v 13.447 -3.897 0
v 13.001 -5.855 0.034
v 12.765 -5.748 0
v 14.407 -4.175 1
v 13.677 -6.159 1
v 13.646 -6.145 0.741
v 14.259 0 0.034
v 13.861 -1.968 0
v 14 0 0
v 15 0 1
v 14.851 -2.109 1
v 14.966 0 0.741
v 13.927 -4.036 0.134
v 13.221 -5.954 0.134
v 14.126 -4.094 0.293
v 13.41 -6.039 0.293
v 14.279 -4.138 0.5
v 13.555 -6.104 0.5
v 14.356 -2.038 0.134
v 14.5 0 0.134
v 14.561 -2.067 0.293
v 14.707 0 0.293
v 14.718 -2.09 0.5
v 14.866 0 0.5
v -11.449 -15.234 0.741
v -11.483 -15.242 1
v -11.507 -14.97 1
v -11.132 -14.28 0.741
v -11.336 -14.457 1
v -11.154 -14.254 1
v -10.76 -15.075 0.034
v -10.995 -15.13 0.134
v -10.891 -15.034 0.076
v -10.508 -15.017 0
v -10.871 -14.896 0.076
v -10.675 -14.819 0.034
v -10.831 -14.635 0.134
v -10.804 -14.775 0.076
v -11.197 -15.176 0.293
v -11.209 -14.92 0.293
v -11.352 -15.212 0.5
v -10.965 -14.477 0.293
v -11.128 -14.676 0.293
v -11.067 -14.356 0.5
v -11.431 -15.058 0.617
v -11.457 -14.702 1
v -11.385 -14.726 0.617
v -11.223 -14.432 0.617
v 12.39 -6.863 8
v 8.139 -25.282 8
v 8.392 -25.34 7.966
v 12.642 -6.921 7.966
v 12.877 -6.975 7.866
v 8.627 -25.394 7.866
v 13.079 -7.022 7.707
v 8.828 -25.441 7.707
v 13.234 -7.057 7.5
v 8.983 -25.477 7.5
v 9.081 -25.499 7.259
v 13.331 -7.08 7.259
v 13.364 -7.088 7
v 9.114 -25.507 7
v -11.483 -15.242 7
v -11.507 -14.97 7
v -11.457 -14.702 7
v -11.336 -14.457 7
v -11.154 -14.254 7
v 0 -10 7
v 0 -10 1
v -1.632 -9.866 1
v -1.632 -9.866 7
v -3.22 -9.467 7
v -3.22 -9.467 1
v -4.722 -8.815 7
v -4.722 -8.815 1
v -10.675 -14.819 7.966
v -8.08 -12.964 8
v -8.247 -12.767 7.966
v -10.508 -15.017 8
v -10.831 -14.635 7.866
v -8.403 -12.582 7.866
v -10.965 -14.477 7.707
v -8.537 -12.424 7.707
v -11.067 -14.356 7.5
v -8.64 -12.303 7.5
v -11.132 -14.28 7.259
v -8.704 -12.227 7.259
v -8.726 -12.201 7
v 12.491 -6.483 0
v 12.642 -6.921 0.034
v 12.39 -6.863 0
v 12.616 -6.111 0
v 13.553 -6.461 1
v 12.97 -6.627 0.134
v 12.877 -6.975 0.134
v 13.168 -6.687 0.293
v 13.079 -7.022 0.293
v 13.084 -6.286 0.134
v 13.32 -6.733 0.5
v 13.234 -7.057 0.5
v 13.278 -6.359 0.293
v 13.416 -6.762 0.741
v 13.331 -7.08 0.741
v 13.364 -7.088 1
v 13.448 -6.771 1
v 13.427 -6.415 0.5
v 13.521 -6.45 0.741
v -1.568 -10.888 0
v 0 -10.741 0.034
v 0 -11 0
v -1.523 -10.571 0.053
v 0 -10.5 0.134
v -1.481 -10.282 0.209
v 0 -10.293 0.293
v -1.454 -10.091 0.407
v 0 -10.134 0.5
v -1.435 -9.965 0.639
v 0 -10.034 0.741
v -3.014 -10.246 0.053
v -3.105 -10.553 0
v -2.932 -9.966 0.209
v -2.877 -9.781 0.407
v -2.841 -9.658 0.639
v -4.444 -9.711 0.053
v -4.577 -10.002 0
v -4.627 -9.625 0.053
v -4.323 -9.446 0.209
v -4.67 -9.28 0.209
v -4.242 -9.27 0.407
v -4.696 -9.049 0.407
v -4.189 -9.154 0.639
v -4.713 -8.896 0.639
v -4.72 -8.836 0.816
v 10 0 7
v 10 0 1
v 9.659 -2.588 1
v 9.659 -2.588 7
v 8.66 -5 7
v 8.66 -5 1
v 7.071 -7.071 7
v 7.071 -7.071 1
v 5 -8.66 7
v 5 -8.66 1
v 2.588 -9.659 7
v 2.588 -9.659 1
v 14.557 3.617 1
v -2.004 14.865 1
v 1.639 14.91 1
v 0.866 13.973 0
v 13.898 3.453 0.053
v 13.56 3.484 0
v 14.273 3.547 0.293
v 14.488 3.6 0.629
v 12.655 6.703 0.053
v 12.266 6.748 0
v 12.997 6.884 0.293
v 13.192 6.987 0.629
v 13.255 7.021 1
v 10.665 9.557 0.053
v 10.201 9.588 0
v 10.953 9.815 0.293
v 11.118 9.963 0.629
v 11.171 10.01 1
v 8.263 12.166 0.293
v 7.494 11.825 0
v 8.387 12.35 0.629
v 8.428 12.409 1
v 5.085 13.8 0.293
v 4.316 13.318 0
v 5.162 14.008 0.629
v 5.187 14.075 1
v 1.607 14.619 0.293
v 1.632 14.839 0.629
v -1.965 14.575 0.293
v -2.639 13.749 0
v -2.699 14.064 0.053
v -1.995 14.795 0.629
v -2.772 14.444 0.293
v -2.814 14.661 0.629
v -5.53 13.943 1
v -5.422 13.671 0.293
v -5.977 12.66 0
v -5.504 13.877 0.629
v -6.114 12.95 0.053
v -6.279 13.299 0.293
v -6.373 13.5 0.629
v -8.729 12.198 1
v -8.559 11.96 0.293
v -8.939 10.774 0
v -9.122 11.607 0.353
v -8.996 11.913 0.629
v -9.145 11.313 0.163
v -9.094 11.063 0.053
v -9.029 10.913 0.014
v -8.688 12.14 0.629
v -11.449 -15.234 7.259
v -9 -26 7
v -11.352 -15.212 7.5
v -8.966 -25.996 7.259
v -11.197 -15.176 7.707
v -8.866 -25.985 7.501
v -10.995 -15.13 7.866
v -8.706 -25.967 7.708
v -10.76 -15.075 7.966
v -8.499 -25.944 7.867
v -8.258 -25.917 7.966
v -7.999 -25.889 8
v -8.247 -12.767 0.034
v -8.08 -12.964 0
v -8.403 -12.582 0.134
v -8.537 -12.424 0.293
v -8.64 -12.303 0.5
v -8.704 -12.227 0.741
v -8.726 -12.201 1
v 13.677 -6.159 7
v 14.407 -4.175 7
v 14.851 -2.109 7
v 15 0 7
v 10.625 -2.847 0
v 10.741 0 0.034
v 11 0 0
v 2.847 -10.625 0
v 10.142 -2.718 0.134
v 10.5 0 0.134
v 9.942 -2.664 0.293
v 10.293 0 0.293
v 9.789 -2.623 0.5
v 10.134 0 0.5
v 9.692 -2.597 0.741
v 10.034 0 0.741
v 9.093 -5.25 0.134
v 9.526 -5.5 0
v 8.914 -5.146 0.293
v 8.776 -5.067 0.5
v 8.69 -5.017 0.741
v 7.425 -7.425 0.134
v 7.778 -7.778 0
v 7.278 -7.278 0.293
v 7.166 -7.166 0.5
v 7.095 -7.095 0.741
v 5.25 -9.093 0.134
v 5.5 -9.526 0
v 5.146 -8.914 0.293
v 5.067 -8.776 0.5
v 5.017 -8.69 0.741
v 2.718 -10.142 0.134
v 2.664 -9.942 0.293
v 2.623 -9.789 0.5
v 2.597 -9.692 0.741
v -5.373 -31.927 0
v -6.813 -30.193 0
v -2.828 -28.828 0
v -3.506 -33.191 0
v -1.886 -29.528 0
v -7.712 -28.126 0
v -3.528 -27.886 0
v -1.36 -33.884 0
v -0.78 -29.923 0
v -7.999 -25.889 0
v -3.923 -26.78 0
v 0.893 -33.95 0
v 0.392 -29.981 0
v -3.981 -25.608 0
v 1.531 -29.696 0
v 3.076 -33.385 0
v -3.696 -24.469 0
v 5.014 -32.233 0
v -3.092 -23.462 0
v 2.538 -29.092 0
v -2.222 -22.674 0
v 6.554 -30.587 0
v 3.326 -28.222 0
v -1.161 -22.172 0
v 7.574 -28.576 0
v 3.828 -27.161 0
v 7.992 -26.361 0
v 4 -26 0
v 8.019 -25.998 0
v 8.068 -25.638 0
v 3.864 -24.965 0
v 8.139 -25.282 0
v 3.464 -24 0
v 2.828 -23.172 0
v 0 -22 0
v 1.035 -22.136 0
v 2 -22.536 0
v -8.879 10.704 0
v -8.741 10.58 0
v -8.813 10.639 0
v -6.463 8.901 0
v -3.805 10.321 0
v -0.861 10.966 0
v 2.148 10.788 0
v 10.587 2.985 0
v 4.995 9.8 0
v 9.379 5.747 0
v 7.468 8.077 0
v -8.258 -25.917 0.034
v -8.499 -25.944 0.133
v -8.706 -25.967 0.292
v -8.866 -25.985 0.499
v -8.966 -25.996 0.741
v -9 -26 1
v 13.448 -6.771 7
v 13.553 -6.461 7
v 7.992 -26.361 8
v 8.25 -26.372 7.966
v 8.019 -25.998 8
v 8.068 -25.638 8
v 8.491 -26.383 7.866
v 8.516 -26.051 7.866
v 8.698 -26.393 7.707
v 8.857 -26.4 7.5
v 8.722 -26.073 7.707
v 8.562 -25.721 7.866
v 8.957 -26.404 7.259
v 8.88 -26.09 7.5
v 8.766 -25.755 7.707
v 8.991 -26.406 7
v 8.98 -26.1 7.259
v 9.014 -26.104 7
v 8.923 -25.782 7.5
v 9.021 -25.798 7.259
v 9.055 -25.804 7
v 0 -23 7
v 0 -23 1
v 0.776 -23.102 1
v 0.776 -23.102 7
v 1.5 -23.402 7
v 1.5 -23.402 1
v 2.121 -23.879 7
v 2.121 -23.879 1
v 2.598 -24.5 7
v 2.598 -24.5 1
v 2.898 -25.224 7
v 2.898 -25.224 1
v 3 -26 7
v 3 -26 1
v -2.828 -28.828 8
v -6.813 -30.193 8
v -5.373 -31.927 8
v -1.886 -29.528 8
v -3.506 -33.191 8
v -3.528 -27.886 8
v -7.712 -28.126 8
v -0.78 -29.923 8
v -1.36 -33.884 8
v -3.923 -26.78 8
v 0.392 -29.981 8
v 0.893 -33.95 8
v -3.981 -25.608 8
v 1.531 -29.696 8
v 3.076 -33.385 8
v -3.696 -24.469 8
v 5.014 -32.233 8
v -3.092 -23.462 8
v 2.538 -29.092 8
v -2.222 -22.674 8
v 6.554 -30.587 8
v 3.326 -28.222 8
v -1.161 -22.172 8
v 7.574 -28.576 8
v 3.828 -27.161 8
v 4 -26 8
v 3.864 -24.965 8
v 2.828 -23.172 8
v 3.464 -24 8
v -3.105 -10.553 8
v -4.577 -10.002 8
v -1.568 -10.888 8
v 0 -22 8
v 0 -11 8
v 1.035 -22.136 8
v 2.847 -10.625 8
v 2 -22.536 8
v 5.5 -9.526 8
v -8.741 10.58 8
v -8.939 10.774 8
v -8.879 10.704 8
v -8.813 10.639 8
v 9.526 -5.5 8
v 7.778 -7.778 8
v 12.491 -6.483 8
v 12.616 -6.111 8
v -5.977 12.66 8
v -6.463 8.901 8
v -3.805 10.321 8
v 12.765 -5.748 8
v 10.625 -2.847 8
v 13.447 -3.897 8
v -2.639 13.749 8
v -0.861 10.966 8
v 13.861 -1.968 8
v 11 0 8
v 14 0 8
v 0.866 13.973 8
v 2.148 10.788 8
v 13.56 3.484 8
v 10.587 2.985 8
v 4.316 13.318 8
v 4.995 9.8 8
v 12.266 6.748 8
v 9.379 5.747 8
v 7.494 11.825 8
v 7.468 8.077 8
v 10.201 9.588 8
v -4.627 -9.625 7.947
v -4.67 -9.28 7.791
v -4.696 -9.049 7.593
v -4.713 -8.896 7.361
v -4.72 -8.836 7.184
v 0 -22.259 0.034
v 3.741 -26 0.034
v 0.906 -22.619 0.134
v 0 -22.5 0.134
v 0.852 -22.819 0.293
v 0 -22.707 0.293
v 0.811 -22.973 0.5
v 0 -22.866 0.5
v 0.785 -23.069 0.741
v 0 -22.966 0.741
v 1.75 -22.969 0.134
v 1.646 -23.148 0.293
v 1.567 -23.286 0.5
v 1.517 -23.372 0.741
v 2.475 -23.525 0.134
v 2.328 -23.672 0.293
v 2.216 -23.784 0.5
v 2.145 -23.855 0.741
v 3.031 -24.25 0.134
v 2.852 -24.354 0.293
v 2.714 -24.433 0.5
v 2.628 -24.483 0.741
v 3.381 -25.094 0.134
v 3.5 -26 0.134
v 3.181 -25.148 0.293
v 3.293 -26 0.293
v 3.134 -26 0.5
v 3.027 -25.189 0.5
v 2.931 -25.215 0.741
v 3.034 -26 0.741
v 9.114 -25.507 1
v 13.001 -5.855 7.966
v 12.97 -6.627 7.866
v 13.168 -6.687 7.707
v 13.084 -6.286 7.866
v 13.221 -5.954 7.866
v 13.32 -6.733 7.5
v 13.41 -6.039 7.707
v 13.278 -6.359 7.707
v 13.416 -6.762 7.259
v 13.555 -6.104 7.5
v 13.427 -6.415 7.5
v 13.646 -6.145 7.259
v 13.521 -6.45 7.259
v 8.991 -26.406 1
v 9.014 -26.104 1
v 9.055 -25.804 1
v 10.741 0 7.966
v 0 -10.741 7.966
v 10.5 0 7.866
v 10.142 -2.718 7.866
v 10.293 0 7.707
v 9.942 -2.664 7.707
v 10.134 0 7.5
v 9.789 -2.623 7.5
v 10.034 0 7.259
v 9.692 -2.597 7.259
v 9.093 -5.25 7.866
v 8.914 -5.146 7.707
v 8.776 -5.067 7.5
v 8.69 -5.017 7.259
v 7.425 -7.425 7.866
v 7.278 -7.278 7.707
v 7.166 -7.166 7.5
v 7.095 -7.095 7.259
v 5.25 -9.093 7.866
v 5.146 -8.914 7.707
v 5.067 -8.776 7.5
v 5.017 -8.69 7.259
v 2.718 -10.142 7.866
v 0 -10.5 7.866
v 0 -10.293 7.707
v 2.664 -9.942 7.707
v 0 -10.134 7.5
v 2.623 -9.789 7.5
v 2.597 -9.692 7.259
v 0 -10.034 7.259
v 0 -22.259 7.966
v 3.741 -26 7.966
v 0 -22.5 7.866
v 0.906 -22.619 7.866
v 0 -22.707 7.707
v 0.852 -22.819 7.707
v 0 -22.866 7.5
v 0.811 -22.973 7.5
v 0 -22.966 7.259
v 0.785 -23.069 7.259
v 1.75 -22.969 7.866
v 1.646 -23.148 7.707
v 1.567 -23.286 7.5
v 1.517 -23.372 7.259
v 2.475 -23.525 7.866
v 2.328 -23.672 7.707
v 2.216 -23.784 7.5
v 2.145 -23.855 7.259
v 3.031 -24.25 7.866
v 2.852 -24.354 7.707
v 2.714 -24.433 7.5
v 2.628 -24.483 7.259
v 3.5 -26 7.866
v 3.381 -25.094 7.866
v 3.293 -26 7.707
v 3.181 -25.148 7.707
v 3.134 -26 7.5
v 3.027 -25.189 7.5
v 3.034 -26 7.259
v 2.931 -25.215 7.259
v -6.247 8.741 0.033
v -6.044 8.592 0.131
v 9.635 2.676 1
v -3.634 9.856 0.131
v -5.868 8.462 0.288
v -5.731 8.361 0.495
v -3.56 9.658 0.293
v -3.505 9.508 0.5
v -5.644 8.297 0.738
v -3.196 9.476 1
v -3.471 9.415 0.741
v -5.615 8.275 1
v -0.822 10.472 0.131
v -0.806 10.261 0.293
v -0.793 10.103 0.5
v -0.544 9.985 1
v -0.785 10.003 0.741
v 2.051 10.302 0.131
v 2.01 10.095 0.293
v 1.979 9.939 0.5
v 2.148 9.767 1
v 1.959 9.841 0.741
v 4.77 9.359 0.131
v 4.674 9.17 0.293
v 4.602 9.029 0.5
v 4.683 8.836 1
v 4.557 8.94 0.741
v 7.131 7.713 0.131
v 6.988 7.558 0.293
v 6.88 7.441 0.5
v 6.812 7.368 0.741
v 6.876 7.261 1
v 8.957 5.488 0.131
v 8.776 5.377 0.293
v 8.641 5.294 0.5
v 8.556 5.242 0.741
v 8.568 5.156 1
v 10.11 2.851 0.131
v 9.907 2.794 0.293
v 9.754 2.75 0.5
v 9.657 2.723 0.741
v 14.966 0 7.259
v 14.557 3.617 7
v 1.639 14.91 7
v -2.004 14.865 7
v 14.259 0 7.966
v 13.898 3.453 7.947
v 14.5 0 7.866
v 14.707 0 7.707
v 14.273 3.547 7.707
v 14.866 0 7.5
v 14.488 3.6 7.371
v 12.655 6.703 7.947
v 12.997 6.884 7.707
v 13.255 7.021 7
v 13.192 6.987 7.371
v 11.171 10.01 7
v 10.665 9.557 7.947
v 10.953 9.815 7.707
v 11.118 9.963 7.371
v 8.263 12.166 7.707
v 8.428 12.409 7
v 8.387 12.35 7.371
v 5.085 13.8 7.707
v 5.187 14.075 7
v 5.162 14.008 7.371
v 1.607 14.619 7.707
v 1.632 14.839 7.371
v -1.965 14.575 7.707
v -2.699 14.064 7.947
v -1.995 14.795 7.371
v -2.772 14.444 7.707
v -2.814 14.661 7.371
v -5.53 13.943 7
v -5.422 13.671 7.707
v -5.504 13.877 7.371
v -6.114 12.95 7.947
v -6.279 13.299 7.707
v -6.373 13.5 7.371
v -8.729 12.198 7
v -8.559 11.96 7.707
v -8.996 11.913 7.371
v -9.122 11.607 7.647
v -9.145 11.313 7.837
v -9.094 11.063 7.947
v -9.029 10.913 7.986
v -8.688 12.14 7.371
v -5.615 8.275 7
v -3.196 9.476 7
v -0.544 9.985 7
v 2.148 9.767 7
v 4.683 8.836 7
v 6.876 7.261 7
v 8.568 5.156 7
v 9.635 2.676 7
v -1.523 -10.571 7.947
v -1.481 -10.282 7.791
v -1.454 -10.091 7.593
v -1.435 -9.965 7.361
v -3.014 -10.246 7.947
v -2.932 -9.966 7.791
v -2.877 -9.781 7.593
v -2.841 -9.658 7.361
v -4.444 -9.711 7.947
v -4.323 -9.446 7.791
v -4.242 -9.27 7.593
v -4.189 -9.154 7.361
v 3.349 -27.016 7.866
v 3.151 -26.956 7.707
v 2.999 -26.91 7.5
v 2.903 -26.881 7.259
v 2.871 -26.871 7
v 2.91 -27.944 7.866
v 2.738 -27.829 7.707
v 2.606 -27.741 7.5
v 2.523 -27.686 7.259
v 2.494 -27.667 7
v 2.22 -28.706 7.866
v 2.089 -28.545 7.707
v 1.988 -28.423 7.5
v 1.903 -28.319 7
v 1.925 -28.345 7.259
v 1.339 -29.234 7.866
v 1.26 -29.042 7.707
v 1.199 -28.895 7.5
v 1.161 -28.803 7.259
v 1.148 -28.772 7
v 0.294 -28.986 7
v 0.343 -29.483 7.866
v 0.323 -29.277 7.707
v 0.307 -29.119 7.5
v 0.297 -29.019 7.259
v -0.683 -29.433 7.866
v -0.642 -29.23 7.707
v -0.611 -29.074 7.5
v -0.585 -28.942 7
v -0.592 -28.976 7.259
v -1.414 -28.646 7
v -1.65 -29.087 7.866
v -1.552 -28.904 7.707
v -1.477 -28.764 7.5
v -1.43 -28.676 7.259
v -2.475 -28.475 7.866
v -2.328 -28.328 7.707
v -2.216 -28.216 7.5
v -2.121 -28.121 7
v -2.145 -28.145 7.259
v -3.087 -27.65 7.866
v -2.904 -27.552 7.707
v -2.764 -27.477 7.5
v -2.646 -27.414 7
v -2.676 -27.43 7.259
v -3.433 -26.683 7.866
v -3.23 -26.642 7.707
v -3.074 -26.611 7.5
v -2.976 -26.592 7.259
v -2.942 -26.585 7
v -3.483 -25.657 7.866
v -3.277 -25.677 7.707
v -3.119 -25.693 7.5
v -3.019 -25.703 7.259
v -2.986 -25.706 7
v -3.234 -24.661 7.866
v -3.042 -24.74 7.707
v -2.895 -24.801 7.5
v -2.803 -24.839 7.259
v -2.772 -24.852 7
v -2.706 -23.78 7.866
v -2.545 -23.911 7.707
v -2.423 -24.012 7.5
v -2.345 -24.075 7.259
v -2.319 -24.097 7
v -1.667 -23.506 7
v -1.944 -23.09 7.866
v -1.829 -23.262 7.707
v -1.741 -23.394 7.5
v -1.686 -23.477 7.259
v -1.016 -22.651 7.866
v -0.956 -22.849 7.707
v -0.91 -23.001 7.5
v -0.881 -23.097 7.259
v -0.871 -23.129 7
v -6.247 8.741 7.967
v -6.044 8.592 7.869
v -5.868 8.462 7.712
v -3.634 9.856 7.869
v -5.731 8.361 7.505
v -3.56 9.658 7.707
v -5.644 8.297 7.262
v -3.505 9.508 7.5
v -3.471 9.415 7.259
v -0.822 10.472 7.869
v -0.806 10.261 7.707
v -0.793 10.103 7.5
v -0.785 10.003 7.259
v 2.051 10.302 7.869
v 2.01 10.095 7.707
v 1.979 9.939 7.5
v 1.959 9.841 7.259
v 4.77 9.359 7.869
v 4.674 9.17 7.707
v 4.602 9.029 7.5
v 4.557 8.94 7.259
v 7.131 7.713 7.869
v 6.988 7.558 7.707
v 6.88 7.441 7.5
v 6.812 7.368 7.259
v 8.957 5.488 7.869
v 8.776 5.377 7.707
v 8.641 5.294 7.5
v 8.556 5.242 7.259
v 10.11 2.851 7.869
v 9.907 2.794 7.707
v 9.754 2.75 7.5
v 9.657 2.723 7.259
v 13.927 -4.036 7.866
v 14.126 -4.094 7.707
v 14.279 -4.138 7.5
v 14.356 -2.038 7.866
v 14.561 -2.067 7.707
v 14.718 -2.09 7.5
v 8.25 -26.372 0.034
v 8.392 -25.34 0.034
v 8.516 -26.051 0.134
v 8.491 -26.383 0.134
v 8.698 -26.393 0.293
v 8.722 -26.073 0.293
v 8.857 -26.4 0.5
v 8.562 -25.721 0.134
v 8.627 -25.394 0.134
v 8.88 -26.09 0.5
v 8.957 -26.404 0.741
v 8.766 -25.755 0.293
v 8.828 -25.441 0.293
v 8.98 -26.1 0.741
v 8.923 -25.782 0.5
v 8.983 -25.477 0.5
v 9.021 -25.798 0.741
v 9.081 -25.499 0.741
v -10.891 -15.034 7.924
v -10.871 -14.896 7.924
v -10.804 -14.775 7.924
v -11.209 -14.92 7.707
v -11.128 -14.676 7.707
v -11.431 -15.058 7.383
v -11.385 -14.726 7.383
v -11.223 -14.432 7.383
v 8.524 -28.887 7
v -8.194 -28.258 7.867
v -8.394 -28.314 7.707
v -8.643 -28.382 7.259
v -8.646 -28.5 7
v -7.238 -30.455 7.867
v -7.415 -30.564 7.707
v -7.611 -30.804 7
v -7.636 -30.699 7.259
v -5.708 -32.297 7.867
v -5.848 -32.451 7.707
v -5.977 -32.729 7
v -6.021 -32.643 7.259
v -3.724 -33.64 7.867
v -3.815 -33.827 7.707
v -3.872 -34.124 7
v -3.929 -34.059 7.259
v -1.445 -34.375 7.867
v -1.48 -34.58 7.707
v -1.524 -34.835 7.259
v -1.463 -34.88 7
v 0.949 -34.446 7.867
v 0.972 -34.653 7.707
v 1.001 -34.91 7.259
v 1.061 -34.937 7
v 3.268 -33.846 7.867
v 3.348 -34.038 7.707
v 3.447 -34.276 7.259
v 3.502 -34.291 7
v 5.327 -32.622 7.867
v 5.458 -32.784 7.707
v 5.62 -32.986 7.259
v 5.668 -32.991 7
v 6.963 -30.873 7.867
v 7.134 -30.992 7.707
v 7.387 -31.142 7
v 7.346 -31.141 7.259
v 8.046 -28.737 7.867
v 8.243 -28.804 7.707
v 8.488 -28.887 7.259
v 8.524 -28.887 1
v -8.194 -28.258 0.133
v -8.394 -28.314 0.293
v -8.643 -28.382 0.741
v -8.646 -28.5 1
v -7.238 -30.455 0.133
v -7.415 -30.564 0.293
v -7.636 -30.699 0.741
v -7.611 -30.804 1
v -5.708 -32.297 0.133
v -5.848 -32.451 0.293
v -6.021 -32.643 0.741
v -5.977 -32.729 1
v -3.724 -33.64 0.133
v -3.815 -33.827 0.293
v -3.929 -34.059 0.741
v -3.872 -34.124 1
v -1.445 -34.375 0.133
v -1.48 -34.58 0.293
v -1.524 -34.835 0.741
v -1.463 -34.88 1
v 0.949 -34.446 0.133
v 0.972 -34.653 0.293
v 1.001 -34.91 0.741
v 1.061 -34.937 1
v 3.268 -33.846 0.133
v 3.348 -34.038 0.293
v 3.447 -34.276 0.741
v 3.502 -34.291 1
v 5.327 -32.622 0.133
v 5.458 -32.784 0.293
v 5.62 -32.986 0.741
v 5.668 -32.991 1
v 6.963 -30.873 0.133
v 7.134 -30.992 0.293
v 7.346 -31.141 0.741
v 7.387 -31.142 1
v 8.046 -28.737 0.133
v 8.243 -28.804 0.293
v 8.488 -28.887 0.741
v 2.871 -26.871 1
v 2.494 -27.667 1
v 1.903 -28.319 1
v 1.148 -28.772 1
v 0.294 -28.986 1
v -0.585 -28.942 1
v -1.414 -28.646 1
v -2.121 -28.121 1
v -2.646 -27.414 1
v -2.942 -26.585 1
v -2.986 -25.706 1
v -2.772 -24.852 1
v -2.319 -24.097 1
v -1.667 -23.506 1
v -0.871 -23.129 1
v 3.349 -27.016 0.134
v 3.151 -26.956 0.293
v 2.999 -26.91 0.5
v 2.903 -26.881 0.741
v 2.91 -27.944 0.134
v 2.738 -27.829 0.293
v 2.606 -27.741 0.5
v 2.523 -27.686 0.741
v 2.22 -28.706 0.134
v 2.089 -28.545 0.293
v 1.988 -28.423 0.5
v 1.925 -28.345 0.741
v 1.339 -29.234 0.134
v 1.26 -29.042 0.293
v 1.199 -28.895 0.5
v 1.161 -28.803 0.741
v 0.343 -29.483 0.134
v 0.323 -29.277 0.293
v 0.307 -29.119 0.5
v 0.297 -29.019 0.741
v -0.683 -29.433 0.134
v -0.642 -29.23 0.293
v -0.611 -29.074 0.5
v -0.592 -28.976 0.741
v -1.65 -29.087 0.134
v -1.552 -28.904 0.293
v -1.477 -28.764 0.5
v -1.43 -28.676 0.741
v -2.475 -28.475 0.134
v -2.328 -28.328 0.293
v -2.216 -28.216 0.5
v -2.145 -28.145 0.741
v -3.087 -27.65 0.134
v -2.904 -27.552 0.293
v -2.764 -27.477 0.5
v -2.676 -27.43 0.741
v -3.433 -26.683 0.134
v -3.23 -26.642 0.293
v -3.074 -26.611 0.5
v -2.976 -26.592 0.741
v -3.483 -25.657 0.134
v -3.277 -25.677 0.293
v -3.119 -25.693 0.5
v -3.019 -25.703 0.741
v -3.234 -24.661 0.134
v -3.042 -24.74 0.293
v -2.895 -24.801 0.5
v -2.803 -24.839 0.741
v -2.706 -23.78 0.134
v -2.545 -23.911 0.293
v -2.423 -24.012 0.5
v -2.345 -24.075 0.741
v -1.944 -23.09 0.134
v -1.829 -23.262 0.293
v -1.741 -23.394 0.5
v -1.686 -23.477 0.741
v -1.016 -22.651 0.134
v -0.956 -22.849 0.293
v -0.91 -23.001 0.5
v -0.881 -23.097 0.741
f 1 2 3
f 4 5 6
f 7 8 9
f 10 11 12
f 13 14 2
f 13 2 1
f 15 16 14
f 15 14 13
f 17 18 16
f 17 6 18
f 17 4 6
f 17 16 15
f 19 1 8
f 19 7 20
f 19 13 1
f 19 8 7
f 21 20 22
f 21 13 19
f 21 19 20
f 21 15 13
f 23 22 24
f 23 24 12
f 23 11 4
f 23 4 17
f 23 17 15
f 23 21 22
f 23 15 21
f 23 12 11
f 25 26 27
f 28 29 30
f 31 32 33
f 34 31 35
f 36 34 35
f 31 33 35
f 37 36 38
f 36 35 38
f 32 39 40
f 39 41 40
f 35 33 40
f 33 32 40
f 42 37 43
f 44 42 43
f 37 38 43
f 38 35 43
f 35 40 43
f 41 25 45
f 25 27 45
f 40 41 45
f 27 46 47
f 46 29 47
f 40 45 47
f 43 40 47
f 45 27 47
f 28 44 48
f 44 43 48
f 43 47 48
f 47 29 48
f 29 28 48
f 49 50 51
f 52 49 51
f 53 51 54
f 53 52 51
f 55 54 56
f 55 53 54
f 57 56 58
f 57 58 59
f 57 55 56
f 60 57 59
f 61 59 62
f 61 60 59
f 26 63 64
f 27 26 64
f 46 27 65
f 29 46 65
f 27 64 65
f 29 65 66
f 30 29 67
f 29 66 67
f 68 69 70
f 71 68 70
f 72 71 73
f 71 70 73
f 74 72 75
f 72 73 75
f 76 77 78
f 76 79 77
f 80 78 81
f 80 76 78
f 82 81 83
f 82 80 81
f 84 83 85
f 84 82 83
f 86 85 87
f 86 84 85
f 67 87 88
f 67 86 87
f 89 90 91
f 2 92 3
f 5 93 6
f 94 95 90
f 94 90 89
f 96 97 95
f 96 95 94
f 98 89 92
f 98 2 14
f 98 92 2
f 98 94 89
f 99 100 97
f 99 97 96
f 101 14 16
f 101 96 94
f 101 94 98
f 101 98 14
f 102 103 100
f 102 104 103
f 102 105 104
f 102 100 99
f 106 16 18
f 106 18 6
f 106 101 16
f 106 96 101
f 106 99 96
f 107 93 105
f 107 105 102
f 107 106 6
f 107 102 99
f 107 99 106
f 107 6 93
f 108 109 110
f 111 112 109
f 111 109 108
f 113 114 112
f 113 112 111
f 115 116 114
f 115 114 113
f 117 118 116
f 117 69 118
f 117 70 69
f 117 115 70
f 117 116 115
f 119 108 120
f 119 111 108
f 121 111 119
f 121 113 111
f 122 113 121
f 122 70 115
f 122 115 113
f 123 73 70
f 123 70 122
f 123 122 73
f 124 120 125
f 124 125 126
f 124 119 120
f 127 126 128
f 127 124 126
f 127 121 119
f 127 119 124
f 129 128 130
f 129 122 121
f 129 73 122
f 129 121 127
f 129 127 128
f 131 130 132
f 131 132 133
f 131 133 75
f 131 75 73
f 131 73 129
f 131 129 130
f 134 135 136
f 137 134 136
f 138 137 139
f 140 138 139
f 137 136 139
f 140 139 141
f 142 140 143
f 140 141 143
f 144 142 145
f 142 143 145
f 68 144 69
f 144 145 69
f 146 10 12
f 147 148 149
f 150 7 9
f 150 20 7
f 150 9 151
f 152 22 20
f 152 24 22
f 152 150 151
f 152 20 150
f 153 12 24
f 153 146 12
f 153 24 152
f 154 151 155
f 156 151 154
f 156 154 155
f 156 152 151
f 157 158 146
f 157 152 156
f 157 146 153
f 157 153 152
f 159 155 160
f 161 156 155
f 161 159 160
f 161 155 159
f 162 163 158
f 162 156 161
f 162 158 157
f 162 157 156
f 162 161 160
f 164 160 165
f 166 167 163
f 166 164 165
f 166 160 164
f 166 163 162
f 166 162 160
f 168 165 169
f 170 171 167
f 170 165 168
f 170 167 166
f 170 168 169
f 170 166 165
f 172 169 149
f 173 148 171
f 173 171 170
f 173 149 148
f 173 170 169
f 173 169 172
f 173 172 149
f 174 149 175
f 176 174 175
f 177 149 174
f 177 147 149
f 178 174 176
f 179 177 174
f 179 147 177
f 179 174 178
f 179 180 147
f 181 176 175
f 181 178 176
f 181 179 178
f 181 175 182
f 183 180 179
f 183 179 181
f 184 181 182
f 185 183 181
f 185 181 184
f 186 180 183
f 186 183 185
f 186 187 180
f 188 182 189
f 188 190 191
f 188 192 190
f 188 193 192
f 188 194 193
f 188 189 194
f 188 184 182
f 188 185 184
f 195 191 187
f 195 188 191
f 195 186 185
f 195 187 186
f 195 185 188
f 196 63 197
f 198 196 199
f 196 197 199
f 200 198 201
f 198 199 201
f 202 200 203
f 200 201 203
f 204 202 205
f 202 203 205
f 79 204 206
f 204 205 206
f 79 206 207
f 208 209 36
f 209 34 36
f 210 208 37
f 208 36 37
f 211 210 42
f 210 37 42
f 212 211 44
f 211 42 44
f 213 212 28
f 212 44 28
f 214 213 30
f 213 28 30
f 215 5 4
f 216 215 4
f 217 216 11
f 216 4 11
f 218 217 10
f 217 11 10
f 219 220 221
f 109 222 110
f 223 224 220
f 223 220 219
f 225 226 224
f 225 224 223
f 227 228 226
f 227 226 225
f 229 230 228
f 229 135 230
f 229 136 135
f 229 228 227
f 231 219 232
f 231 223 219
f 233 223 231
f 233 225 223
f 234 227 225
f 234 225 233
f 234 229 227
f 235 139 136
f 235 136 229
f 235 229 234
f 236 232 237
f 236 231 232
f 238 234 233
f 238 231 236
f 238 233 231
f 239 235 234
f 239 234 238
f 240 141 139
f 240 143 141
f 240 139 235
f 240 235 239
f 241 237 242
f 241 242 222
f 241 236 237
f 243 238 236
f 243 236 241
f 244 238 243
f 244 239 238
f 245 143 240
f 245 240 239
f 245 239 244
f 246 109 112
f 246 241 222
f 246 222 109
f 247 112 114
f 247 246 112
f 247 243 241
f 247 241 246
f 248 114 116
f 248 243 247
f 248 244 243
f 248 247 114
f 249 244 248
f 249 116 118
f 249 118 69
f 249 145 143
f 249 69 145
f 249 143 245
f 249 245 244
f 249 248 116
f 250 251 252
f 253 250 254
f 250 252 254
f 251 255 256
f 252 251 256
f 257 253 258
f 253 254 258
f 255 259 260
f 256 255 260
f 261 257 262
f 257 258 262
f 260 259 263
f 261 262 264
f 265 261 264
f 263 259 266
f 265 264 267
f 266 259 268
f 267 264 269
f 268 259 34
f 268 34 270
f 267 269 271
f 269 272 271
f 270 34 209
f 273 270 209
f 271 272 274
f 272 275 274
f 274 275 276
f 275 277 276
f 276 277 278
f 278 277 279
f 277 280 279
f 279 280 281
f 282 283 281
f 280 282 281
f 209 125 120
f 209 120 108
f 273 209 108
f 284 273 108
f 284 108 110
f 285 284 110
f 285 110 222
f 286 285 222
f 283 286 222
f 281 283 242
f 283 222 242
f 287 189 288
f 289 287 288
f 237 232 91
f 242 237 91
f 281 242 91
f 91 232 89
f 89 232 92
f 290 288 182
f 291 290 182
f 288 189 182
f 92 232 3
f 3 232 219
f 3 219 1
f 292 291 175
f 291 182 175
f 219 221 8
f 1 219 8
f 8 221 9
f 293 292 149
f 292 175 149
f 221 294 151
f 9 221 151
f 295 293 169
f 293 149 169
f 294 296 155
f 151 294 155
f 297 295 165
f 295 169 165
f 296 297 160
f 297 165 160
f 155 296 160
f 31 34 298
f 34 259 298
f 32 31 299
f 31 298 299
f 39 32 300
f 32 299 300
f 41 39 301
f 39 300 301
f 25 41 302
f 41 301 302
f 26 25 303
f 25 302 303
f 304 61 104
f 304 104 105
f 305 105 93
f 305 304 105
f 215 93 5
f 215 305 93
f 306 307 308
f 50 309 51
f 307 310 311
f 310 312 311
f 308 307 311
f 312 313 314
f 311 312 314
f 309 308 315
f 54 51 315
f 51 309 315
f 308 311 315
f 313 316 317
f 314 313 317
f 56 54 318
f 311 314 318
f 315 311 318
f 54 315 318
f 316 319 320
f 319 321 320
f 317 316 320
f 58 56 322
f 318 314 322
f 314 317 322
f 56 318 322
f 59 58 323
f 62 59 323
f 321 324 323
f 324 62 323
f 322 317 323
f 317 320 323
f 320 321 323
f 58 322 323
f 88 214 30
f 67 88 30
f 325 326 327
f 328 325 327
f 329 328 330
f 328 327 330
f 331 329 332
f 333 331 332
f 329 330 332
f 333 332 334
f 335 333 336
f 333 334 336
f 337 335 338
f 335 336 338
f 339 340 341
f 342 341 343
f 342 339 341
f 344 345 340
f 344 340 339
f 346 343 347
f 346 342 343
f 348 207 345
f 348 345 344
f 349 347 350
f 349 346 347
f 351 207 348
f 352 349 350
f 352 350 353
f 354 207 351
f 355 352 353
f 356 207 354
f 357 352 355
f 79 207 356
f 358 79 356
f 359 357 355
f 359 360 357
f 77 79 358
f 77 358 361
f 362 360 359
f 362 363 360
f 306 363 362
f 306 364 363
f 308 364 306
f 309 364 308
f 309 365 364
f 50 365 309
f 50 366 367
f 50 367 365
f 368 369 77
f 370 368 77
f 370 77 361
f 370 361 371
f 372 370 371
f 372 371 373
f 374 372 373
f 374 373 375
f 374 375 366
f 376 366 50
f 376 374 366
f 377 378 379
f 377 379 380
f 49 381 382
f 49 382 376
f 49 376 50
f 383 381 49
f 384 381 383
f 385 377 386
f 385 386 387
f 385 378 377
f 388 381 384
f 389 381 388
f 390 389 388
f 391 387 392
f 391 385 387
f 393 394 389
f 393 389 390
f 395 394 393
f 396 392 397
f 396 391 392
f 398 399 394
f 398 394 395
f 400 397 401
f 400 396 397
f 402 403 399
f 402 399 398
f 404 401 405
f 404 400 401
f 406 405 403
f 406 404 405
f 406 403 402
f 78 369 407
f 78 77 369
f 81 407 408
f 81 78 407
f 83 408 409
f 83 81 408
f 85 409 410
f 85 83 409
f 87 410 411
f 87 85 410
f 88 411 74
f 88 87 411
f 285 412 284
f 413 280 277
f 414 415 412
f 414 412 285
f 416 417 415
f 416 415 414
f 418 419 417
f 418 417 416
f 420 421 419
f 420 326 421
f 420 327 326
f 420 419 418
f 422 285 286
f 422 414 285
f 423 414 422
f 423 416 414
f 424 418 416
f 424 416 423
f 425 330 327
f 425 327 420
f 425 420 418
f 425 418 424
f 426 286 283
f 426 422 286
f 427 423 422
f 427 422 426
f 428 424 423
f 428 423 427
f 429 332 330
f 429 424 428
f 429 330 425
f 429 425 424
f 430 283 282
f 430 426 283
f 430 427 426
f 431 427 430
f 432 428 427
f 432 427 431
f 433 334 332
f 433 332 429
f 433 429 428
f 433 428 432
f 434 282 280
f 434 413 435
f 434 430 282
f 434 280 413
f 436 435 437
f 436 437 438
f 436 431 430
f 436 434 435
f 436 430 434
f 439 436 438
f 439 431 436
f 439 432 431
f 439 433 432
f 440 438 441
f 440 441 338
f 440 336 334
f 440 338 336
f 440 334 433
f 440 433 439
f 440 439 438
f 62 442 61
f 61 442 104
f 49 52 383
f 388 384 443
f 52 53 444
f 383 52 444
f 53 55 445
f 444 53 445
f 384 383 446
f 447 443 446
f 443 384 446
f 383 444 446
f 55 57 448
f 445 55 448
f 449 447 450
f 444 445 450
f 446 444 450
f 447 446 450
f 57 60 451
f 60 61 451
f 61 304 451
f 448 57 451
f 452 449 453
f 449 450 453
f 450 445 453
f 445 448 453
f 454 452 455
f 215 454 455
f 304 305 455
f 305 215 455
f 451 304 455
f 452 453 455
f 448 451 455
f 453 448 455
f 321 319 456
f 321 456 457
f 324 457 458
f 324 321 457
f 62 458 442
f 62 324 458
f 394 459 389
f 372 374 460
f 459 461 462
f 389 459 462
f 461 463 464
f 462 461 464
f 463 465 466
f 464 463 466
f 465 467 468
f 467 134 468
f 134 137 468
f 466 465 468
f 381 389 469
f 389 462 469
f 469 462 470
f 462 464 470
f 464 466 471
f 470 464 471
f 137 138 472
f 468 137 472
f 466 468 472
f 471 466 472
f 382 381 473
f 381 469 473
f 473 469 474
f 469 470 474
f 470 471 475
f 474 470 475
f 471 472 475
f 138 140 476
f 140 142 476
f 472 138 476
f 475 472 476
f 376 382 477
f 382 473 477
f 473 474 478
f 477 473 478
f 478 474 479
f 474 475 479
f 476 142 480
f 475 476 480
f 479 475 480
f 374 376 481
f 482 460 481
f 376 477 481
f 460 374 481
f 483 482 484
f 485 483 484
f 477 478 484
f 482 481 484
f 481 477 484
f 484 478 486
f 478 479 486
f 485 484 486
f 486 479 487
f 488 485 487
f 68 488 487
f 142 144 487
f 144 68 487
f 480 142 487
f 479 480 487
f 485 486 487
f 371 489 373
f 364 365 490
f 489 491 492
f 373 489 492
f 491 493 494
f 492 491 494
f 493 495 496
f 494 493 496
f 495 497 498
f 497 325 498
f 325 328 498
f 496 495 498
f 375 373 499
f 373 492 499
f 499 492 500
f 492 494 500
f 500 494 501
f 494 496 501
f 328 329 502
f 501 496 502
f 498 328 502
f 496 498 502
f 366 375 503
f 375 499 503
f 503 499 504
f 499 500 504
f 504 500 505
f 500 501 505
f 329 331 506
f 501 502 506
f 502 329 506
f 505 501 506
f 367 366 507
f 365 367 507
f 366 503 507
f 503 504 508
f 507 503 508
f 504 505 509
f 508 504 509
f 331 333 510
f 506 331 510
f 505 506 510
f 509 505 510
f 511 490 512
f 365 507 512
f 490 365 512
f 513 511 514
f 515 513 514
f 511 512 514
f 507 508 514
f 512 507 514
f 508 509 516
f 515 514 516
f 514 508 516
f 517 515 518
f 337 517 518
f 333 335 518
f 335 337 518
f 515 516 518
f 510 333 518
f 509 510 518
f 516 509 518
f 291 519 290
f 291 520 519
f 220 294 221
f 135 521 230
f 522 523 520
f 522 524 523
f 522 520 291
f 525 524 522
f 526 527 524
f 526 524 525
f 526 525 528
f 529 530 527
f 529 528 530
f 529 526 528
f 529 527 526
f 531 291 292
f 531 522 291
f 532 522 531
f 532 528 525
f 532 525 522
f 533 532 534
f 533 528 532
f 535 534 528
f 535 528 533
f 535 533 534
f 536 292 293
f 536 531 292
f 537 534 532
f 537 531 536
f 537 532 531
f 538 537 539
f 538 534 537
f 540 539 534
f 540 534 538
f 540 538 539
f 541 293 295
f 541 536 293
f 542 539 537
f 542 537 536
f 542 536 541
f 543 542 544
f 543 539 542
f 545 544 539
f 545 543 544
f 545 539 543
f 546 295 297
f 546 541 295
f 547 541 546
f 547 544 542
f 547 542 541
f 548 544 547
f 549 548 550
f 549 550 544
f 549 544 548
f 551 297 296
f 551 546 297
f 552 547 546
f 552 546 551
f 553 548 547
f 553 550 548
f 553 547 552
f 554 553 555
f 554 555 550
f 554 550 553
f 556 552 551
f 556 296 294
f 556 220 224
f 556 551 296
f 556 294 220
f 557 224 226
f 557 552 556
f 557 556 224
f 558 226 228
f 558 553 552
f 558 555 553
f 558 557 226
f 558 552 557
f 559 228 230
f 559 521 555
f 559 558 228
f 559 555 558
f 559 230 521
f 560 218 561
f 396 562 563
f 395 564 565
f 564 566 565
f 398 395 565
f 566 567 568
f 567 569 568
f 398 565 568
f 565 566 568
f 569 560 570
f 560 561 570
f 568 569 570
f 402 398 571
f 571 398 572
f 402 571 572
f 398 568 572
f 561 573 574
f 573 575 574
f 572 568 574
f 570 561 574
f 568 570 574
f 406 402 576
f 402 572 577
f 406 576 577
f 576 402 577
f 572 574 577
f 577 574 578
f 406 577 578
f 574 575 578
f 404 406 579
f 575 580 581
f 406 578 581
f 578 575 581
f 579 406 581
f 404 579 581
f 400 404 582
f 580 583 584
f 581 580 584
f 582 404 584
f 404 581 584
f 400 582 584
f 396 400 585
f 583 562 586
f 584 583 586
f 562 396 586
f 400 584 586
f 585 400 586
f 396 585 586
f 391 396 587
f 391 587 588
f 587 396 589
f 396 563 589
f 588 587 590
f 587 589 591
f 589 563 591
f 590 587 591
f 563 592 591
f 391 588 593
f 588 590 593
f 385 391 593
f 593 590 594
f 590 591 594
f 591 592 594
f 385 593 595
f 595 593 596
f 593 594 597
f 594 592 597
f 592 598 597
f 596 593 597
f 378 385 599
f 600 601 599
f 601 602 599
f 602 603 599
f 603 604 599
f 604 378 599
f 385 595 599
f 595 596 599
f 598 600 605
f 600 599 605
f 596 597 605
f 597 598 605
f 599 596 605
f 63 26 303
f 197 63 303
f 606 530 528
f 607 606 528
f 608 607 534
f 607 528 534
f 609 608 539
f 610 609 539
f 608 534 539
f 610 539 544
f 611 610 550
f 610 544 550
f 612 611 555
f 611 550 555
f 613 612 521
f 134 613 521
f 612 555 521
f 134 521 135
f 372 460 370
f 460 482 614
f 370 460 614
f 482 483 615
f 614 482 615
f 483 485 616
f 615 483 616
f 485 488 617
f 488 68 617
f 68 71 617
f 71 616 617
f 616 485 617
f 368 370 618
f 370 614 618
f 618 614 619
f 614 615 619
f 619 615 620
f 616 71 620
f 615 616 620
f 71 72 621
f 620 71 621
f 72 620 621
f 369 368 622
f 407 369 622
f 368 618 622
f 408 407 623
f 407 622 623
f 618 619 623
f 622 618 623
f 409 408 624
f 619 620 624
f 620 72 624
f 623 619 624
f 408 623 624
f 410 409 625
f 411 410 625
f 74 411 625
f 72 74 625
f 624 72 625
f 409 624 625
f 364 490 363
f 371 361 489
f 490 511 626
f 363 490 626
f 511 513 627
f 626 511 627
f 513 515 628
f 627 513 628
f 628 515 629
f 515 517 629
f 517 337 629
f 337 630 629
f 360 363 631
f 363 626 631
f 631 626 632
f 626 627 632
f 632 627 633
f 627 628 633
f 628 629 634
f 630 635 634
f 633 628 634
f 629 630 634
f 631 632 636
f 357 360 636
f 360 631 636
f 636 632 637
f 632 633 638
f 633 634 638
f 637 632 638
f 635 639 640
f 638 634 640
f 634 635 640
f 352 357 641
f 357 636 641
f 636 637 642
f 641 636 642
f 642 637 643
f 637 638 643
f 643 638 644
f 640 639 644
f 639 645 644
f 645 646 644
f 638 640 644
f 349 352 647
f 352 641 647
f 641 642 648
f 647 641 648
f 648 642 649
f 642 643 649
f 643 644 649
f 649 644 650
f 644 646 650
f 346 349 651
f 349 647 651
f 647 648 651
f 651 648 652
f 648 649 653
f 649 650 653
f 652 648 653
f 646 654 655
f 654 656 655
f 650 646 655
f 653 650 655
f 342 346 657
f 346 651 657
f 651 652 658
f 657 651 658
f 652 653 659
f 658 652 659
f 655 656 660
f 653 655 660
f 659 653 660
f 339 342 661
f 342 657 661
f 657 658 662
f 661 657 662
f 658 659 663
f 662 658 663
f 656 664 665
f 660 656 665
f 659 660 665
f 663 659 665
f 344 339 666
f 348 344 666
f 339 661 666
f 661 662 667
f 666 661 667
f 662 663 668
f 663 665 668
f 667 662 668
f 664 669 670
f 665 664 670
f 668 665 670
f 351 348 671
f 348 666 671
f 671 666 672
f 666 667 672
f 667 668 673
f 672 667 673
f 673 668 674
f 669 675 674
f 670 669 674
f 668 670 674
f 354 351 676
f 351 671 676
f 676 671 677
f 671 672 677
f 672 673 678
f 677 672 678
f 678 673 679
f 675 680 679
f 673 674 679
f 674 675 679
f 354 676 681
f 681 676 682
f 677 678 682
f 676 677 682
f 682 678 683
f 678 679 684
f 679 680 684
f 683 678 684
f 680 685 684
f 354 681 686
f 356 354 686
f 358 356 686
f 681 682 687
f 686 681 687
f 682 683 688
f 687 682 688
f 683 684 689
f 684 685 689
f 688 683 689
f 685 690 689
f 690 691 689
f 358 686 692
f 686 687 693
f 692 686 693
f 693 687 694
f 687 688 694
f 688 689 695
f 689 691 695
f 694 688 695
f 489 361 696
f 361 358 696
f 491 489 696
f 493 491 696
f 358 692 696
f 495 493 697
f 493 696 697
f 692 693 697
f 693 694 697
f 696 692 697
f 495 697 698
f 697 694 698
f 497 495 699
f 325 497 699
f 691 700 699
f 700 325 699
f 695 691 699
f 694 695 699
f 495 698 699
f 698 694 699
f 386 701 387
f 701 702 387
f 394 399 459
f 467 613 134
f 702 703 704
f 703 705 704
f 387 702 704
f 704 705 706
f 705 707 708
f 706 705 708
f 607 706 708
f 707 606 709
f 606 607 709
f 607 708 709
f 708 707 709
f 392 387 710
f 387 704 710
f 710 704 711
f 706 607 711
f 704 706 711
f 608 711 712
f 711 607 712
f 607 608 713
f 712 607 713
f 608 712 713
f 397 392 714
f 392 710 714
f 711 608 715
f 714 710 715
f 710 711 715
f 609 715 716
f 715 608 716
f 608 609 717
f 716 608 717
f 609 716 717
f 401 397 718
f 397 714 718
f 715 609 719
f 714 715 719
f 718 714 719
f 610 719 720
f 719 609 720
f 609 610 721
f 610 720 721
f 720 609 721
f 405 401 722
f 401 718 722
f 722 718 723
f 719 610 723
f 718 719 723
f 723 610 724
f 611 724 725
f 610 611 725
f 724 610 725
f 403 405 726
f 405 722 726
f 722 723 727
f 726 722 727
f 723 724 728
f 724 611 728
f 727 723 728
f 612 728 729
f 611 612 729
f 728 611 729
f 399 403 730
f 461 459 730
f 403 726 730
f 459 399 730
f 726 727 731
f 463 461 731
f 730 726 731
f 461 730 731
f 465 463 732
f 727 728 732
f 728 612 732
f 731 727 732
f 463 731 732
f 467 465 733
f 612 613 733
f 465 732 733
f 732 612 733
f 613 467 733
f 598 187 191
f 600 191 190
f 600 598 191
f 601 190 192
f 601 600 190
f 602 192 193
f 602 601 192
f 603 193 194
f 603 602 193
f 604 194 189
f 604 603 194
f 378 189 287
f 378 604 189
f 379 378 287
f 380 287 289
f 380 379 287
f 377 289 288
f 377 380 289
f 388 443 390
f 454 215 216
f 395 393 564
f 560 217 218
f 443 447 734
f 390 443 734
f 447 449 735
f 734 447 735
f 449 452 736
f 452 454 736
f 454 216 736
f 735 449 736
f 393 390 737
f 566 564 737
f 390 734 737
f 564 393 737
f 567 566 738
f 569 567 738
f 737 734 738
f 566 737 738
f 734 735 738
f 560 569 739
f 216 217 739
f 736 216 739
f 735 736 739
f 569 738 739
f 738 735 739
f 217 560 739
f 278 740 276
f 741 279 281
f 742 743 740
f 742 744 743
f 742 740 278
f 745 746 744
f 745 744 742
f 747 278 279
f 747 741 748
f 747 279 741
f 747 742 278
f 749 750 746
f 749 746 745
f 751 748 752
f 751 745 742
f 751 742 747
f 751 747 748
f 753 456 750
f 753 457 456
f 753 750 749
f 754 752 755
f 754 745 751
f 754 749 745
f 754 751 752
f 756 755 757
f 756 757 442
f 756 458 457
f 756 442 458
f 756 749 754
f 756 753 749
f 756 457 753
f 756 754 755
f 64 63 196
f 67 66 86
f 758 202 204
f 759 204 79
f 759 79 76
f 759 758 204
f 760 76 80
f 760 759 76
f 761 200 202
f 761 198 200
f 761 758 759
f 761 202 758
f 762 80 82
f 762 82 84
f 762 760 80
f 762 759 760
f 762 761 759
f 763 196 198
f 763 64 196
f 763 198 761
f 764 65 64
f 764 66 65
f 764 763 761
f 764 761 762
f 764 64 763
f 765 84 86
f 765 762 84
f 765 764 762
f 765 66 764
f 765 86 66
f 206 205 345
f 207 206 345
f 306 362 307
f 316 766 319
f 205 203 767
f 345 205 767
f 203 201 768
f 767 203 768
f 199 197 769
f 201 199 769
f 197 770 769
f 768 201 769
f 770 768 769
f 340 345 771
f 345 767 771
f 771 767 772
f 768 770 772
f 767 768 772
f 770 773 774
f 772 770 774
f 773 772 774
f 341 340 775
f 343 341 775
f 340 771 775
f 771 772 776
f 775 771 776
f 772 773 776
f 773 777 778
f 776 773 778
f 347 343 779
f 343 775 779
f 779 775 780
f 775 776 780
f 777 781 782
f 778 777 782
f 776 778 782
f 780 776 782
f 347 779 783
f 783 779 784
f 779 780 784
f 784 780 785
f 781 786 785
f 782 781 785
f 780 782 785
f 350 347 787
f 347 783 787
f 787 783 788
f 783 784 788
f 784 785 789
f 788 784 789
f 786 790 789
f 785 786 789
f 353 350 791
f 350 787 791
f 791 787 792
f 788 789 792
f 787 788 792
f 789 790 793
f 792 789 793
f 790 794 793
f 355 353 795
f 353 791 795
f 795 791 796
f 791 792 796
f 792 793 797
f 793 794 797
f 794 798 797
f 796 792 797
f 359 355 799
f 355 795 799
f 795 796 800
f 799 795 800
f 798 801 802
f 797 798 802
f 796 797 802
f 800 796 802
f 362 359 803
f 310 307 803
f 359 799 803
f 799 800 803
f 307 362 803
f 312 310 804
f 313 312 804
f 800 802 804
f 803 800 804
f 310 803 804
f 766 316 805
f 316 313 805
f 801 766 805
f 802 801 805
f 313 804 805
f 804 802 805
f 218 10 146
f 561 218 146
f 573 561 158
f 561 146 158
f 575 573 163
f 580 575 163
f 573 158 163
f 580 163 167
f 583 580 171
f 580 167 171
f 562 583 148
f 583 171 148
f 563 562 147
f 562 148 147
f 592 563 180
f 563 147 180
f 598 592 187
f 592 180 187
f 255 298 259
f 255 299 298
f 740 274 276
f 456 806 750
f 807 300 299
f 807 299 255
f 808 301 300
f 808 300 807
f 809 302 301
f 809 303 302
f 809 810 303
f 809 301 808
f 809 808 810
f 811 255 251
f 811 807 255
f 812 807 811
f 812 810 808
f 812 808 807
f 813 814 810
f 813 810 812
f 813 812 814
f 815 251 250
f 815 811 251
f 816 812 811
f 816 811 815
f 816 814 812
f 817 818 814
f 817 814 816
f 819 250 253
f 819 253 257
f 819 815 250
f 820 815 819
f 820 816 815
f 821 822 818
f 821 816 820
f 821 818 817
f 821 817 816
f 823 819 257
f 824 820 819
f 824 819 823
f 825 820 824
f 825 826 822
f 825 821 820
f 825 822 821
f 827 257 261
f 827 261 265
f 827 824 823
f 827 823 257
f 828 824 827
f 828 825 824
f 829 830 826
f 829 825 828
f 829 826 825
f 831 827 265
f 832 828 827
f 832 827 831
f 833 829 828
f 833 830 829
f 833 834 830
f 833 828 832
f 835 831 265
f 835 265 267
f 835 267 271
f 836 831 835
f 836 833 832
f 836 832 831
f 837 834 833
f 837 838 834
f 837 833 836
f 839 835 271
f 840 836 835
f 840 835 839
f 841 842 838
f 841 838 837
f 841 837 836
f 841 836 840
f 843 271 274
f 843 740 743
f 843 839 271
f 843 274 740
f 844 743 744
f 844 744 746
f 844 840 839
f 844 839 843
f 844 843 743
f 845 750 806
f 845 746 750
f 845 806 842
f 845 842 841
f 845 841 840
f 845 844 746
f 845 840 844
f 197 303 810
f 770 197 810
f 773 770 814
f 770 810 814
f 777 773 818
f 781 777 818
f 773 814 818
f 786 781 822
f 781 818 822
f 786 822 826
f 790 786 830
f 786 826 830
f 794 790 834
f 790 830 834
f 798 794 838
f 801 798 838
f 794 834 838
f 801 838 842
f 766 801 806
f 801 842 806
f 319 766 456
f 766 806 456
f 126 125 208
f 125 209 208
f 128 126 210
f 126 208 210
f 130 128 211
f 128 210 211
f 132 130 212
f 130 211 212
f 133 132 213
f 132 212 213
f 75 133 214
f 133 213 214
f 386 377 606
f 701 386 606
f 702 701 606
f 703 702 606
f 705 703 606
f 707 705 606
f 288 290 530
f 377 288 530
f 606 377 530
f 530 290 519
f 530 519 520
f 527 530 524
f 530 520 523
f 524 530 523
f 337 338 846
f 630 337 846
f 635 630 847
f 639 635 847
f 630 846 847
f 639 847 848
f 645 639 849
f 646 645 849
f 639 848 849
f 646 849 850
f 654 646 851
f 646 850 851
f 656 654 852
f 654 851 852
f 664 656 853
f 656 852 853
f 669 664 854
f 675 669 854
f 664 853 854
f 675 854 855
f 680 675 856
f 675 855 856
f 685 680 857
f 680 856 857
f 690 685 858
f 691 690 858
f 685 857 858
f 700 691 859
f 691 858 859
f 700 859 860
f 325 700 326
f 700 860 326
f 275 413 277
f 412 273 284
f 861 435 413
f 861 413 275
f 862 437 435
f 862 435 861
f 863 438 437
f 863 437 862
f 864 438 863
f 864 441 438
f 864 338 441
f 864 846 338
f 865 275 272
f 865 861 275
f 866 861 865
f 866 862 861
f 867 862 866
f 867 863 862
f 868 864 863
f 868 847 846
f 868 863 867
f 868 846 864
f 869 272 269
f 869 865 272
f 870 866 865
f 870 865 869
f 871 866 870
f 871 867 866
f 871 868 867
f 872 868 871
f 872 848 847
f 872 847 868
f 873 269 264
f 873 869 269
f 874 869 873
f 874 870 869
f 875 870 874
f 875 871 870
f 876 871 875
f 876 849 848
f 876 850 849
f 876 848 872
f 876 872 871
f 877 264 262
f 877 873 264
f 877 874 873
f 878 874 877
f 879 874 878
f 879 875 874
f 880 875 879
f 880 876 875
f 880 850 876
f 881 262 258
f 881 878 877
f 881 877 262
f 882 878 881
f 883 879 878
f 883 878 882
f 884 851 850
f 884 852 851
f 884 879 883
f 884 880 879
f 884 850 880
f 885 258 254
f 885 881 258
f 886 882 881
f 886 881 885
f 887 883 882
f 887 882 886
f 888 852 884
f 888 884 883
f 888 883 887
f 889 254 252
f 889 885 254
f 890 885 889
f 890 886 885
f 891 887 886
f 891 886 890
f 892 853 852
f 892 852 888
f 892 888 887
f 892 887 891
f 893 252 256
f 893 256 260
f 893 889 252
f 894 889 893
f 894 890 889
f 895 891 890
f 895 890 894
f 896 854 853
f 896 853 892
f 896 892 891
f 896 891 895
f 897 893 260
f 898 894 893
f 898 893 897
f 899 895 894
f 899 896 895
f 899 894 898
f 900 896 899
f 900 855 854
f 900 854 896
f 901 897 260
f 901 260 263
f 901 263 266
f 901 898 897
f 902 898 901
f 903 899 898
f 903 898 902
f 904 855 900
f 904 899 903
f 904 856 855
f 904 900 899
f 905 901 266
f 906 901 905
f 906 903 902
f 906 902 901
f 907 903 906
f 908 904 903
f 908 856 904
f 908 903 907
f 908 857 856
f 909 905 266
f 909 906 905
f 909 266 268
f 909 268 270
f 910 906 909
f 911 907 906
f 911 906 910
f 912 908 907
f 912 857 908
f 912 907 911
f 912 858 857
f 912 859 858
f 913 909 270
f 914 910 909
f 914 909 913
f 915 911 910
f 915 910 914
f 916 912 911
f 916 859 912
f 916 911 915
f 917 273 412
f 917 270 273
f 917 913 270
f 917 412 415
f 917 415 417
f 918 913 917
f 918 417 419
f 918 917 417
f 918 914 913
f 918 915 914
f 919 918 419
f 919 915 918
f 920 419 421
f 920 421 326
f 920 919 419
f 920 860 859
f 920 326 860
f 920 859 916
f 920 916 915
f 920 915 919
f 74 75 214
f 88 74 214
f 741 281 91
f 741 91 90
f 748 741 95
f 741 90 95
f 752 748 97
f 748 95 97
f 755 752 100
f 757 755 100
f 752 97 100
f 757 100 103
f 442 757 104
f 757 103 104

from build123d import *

# Parameters (mm, degrees)
F1_DEPTH = 8
F2_R     = 5
F3_R     = 1


with BuildPart() as f1:
    # F0 (on Top) → F1 (new body)
    with BuildSketch(Plane.XY):
        with BuildLine():
            ThreePointArc((-5.6145125027, 8.2750981479), (4.6826741811, 8.8358679547), (10, 0))
            Line((10, 0), (15, 0))
            ThreePointArc((15, 0), (6.2469492559, 13.6372880366), (-9.7967499992, 11.3588595137))
            Line((-9.7967499992, 11.3588595137), (-5.6145125027, 8.2750981479))
        make_face()
        with BuildLine():
            Line((15, 0), (10, 0))
            ThreePointArc((10, 0), (7.0710678119, -7.0710678119), (0, -10))
            Line((0, -10), (0, -15))
            ThreePointArc((0, -15), (7.9499841, -12.7199745601), (13.4831460674, -6.5730337079))
            Line((13.4831460674, -6.5730337079), (15, 0))
        make_face()
        with BuildLine():
            ThreePointArc((13.4831460674, -6.5730337079), (7.9499841, -12.7199745601), (0, -15))
            Line((0, -15), (0, -17))
            ThreePointArc((0, -17), (6.3639610307, -19.6360389693), (9, -26))
            Line((9, -26), (13.4831460674, -6.5730337079))
        make_face()
        with BuildLine():
            ThreePointArc((9, -26), (6.3639610307, -19.6360389693), (0, -17))
            ThreePointArc((0, -17), (-6.3639610307, -19.6360389693), (-9, -26))
            ThreePointArc((-9, -26), (0, -35), (9, -26))
        make_face()
        with BuildLine():
            ThreePointArc((3, -26), (-2.1213203436, -28.1213203436), (0, -23))
            ThreePointArc((0, -23), (2.1213203436, -23.8786796564), (3, -26))
        make_face(mode=Mode.SUBTRACT)
        with BuildLine():
            Line((0, -17), (0, -15))
            ThreePointArc((0, -15), (-4.5820343187, -14.2830305433), (-8.7260448167, -12.2006615336))
            Line((-8.7260448167, -12.2006615336), (-11.6198164078, -14.6474622328))
            Line((-11.6198164078, -14.6474622328), (-9, -26))
            ThreePointArc((-9, -26), (-6.3639610307, -19.6360389693), (0, -17))
        make_face()
        with BuildLine():
            Line((0, -15), (0, -10))
            ThreePointArc((0, -10), (-2.434154238, -9.6992212649), (-4.7218801094, -8.8149786292))
            Line((-4.7218801094, -8.8149786292), (-8.7260448167, -12.2006615336))
            ThreePointArc((-8.7260448167, -12.2006615336), (-4.5820343187, -14.2830305433), (0, -15))
        make_face()
        with BuildLine():
            ThreePointArc((13.4831460674, -6.5730337079), (14.6158679354, -3.3728926005), (15, 0))
            Line((15, 0), (13.4831460674, -6.5730337079))
        make_face()
    extrude(amount=F1_DEPTH)

    # F2
    f2_edges = [f1.edges().sort_by_distance(p)[0] for p in [
        (13.483146, -6.573034, 4),
        (9, -26, 4),
    ]]
    fillet(f2_edges, radius=F2_R)

    # F3
    f3_edges = [f1.edges().sort_by_distance(p)[0] for p in [
        (-3, -26, 0),
        (-3, -26, 8),
        (9.986387, 0.521599, 8),
        (9.986387, 0.521599, 0),
        (-8.170848, -11.73122, 8),
        (-8.170848, -11.73122, 0),
        (-11.619816, -14.647462, 4),
        (-10.309908, -20.323731, 8),
        (-10.309908, -20.323731, 0),
        (-9.79675, 11.35886, 4),
        (8.971222, 12.02153, 0),
        (8.971222, 12.02153, 8),
    ]]
    fillet(f3_edges, radius=F3_R)


solid = f1.part
